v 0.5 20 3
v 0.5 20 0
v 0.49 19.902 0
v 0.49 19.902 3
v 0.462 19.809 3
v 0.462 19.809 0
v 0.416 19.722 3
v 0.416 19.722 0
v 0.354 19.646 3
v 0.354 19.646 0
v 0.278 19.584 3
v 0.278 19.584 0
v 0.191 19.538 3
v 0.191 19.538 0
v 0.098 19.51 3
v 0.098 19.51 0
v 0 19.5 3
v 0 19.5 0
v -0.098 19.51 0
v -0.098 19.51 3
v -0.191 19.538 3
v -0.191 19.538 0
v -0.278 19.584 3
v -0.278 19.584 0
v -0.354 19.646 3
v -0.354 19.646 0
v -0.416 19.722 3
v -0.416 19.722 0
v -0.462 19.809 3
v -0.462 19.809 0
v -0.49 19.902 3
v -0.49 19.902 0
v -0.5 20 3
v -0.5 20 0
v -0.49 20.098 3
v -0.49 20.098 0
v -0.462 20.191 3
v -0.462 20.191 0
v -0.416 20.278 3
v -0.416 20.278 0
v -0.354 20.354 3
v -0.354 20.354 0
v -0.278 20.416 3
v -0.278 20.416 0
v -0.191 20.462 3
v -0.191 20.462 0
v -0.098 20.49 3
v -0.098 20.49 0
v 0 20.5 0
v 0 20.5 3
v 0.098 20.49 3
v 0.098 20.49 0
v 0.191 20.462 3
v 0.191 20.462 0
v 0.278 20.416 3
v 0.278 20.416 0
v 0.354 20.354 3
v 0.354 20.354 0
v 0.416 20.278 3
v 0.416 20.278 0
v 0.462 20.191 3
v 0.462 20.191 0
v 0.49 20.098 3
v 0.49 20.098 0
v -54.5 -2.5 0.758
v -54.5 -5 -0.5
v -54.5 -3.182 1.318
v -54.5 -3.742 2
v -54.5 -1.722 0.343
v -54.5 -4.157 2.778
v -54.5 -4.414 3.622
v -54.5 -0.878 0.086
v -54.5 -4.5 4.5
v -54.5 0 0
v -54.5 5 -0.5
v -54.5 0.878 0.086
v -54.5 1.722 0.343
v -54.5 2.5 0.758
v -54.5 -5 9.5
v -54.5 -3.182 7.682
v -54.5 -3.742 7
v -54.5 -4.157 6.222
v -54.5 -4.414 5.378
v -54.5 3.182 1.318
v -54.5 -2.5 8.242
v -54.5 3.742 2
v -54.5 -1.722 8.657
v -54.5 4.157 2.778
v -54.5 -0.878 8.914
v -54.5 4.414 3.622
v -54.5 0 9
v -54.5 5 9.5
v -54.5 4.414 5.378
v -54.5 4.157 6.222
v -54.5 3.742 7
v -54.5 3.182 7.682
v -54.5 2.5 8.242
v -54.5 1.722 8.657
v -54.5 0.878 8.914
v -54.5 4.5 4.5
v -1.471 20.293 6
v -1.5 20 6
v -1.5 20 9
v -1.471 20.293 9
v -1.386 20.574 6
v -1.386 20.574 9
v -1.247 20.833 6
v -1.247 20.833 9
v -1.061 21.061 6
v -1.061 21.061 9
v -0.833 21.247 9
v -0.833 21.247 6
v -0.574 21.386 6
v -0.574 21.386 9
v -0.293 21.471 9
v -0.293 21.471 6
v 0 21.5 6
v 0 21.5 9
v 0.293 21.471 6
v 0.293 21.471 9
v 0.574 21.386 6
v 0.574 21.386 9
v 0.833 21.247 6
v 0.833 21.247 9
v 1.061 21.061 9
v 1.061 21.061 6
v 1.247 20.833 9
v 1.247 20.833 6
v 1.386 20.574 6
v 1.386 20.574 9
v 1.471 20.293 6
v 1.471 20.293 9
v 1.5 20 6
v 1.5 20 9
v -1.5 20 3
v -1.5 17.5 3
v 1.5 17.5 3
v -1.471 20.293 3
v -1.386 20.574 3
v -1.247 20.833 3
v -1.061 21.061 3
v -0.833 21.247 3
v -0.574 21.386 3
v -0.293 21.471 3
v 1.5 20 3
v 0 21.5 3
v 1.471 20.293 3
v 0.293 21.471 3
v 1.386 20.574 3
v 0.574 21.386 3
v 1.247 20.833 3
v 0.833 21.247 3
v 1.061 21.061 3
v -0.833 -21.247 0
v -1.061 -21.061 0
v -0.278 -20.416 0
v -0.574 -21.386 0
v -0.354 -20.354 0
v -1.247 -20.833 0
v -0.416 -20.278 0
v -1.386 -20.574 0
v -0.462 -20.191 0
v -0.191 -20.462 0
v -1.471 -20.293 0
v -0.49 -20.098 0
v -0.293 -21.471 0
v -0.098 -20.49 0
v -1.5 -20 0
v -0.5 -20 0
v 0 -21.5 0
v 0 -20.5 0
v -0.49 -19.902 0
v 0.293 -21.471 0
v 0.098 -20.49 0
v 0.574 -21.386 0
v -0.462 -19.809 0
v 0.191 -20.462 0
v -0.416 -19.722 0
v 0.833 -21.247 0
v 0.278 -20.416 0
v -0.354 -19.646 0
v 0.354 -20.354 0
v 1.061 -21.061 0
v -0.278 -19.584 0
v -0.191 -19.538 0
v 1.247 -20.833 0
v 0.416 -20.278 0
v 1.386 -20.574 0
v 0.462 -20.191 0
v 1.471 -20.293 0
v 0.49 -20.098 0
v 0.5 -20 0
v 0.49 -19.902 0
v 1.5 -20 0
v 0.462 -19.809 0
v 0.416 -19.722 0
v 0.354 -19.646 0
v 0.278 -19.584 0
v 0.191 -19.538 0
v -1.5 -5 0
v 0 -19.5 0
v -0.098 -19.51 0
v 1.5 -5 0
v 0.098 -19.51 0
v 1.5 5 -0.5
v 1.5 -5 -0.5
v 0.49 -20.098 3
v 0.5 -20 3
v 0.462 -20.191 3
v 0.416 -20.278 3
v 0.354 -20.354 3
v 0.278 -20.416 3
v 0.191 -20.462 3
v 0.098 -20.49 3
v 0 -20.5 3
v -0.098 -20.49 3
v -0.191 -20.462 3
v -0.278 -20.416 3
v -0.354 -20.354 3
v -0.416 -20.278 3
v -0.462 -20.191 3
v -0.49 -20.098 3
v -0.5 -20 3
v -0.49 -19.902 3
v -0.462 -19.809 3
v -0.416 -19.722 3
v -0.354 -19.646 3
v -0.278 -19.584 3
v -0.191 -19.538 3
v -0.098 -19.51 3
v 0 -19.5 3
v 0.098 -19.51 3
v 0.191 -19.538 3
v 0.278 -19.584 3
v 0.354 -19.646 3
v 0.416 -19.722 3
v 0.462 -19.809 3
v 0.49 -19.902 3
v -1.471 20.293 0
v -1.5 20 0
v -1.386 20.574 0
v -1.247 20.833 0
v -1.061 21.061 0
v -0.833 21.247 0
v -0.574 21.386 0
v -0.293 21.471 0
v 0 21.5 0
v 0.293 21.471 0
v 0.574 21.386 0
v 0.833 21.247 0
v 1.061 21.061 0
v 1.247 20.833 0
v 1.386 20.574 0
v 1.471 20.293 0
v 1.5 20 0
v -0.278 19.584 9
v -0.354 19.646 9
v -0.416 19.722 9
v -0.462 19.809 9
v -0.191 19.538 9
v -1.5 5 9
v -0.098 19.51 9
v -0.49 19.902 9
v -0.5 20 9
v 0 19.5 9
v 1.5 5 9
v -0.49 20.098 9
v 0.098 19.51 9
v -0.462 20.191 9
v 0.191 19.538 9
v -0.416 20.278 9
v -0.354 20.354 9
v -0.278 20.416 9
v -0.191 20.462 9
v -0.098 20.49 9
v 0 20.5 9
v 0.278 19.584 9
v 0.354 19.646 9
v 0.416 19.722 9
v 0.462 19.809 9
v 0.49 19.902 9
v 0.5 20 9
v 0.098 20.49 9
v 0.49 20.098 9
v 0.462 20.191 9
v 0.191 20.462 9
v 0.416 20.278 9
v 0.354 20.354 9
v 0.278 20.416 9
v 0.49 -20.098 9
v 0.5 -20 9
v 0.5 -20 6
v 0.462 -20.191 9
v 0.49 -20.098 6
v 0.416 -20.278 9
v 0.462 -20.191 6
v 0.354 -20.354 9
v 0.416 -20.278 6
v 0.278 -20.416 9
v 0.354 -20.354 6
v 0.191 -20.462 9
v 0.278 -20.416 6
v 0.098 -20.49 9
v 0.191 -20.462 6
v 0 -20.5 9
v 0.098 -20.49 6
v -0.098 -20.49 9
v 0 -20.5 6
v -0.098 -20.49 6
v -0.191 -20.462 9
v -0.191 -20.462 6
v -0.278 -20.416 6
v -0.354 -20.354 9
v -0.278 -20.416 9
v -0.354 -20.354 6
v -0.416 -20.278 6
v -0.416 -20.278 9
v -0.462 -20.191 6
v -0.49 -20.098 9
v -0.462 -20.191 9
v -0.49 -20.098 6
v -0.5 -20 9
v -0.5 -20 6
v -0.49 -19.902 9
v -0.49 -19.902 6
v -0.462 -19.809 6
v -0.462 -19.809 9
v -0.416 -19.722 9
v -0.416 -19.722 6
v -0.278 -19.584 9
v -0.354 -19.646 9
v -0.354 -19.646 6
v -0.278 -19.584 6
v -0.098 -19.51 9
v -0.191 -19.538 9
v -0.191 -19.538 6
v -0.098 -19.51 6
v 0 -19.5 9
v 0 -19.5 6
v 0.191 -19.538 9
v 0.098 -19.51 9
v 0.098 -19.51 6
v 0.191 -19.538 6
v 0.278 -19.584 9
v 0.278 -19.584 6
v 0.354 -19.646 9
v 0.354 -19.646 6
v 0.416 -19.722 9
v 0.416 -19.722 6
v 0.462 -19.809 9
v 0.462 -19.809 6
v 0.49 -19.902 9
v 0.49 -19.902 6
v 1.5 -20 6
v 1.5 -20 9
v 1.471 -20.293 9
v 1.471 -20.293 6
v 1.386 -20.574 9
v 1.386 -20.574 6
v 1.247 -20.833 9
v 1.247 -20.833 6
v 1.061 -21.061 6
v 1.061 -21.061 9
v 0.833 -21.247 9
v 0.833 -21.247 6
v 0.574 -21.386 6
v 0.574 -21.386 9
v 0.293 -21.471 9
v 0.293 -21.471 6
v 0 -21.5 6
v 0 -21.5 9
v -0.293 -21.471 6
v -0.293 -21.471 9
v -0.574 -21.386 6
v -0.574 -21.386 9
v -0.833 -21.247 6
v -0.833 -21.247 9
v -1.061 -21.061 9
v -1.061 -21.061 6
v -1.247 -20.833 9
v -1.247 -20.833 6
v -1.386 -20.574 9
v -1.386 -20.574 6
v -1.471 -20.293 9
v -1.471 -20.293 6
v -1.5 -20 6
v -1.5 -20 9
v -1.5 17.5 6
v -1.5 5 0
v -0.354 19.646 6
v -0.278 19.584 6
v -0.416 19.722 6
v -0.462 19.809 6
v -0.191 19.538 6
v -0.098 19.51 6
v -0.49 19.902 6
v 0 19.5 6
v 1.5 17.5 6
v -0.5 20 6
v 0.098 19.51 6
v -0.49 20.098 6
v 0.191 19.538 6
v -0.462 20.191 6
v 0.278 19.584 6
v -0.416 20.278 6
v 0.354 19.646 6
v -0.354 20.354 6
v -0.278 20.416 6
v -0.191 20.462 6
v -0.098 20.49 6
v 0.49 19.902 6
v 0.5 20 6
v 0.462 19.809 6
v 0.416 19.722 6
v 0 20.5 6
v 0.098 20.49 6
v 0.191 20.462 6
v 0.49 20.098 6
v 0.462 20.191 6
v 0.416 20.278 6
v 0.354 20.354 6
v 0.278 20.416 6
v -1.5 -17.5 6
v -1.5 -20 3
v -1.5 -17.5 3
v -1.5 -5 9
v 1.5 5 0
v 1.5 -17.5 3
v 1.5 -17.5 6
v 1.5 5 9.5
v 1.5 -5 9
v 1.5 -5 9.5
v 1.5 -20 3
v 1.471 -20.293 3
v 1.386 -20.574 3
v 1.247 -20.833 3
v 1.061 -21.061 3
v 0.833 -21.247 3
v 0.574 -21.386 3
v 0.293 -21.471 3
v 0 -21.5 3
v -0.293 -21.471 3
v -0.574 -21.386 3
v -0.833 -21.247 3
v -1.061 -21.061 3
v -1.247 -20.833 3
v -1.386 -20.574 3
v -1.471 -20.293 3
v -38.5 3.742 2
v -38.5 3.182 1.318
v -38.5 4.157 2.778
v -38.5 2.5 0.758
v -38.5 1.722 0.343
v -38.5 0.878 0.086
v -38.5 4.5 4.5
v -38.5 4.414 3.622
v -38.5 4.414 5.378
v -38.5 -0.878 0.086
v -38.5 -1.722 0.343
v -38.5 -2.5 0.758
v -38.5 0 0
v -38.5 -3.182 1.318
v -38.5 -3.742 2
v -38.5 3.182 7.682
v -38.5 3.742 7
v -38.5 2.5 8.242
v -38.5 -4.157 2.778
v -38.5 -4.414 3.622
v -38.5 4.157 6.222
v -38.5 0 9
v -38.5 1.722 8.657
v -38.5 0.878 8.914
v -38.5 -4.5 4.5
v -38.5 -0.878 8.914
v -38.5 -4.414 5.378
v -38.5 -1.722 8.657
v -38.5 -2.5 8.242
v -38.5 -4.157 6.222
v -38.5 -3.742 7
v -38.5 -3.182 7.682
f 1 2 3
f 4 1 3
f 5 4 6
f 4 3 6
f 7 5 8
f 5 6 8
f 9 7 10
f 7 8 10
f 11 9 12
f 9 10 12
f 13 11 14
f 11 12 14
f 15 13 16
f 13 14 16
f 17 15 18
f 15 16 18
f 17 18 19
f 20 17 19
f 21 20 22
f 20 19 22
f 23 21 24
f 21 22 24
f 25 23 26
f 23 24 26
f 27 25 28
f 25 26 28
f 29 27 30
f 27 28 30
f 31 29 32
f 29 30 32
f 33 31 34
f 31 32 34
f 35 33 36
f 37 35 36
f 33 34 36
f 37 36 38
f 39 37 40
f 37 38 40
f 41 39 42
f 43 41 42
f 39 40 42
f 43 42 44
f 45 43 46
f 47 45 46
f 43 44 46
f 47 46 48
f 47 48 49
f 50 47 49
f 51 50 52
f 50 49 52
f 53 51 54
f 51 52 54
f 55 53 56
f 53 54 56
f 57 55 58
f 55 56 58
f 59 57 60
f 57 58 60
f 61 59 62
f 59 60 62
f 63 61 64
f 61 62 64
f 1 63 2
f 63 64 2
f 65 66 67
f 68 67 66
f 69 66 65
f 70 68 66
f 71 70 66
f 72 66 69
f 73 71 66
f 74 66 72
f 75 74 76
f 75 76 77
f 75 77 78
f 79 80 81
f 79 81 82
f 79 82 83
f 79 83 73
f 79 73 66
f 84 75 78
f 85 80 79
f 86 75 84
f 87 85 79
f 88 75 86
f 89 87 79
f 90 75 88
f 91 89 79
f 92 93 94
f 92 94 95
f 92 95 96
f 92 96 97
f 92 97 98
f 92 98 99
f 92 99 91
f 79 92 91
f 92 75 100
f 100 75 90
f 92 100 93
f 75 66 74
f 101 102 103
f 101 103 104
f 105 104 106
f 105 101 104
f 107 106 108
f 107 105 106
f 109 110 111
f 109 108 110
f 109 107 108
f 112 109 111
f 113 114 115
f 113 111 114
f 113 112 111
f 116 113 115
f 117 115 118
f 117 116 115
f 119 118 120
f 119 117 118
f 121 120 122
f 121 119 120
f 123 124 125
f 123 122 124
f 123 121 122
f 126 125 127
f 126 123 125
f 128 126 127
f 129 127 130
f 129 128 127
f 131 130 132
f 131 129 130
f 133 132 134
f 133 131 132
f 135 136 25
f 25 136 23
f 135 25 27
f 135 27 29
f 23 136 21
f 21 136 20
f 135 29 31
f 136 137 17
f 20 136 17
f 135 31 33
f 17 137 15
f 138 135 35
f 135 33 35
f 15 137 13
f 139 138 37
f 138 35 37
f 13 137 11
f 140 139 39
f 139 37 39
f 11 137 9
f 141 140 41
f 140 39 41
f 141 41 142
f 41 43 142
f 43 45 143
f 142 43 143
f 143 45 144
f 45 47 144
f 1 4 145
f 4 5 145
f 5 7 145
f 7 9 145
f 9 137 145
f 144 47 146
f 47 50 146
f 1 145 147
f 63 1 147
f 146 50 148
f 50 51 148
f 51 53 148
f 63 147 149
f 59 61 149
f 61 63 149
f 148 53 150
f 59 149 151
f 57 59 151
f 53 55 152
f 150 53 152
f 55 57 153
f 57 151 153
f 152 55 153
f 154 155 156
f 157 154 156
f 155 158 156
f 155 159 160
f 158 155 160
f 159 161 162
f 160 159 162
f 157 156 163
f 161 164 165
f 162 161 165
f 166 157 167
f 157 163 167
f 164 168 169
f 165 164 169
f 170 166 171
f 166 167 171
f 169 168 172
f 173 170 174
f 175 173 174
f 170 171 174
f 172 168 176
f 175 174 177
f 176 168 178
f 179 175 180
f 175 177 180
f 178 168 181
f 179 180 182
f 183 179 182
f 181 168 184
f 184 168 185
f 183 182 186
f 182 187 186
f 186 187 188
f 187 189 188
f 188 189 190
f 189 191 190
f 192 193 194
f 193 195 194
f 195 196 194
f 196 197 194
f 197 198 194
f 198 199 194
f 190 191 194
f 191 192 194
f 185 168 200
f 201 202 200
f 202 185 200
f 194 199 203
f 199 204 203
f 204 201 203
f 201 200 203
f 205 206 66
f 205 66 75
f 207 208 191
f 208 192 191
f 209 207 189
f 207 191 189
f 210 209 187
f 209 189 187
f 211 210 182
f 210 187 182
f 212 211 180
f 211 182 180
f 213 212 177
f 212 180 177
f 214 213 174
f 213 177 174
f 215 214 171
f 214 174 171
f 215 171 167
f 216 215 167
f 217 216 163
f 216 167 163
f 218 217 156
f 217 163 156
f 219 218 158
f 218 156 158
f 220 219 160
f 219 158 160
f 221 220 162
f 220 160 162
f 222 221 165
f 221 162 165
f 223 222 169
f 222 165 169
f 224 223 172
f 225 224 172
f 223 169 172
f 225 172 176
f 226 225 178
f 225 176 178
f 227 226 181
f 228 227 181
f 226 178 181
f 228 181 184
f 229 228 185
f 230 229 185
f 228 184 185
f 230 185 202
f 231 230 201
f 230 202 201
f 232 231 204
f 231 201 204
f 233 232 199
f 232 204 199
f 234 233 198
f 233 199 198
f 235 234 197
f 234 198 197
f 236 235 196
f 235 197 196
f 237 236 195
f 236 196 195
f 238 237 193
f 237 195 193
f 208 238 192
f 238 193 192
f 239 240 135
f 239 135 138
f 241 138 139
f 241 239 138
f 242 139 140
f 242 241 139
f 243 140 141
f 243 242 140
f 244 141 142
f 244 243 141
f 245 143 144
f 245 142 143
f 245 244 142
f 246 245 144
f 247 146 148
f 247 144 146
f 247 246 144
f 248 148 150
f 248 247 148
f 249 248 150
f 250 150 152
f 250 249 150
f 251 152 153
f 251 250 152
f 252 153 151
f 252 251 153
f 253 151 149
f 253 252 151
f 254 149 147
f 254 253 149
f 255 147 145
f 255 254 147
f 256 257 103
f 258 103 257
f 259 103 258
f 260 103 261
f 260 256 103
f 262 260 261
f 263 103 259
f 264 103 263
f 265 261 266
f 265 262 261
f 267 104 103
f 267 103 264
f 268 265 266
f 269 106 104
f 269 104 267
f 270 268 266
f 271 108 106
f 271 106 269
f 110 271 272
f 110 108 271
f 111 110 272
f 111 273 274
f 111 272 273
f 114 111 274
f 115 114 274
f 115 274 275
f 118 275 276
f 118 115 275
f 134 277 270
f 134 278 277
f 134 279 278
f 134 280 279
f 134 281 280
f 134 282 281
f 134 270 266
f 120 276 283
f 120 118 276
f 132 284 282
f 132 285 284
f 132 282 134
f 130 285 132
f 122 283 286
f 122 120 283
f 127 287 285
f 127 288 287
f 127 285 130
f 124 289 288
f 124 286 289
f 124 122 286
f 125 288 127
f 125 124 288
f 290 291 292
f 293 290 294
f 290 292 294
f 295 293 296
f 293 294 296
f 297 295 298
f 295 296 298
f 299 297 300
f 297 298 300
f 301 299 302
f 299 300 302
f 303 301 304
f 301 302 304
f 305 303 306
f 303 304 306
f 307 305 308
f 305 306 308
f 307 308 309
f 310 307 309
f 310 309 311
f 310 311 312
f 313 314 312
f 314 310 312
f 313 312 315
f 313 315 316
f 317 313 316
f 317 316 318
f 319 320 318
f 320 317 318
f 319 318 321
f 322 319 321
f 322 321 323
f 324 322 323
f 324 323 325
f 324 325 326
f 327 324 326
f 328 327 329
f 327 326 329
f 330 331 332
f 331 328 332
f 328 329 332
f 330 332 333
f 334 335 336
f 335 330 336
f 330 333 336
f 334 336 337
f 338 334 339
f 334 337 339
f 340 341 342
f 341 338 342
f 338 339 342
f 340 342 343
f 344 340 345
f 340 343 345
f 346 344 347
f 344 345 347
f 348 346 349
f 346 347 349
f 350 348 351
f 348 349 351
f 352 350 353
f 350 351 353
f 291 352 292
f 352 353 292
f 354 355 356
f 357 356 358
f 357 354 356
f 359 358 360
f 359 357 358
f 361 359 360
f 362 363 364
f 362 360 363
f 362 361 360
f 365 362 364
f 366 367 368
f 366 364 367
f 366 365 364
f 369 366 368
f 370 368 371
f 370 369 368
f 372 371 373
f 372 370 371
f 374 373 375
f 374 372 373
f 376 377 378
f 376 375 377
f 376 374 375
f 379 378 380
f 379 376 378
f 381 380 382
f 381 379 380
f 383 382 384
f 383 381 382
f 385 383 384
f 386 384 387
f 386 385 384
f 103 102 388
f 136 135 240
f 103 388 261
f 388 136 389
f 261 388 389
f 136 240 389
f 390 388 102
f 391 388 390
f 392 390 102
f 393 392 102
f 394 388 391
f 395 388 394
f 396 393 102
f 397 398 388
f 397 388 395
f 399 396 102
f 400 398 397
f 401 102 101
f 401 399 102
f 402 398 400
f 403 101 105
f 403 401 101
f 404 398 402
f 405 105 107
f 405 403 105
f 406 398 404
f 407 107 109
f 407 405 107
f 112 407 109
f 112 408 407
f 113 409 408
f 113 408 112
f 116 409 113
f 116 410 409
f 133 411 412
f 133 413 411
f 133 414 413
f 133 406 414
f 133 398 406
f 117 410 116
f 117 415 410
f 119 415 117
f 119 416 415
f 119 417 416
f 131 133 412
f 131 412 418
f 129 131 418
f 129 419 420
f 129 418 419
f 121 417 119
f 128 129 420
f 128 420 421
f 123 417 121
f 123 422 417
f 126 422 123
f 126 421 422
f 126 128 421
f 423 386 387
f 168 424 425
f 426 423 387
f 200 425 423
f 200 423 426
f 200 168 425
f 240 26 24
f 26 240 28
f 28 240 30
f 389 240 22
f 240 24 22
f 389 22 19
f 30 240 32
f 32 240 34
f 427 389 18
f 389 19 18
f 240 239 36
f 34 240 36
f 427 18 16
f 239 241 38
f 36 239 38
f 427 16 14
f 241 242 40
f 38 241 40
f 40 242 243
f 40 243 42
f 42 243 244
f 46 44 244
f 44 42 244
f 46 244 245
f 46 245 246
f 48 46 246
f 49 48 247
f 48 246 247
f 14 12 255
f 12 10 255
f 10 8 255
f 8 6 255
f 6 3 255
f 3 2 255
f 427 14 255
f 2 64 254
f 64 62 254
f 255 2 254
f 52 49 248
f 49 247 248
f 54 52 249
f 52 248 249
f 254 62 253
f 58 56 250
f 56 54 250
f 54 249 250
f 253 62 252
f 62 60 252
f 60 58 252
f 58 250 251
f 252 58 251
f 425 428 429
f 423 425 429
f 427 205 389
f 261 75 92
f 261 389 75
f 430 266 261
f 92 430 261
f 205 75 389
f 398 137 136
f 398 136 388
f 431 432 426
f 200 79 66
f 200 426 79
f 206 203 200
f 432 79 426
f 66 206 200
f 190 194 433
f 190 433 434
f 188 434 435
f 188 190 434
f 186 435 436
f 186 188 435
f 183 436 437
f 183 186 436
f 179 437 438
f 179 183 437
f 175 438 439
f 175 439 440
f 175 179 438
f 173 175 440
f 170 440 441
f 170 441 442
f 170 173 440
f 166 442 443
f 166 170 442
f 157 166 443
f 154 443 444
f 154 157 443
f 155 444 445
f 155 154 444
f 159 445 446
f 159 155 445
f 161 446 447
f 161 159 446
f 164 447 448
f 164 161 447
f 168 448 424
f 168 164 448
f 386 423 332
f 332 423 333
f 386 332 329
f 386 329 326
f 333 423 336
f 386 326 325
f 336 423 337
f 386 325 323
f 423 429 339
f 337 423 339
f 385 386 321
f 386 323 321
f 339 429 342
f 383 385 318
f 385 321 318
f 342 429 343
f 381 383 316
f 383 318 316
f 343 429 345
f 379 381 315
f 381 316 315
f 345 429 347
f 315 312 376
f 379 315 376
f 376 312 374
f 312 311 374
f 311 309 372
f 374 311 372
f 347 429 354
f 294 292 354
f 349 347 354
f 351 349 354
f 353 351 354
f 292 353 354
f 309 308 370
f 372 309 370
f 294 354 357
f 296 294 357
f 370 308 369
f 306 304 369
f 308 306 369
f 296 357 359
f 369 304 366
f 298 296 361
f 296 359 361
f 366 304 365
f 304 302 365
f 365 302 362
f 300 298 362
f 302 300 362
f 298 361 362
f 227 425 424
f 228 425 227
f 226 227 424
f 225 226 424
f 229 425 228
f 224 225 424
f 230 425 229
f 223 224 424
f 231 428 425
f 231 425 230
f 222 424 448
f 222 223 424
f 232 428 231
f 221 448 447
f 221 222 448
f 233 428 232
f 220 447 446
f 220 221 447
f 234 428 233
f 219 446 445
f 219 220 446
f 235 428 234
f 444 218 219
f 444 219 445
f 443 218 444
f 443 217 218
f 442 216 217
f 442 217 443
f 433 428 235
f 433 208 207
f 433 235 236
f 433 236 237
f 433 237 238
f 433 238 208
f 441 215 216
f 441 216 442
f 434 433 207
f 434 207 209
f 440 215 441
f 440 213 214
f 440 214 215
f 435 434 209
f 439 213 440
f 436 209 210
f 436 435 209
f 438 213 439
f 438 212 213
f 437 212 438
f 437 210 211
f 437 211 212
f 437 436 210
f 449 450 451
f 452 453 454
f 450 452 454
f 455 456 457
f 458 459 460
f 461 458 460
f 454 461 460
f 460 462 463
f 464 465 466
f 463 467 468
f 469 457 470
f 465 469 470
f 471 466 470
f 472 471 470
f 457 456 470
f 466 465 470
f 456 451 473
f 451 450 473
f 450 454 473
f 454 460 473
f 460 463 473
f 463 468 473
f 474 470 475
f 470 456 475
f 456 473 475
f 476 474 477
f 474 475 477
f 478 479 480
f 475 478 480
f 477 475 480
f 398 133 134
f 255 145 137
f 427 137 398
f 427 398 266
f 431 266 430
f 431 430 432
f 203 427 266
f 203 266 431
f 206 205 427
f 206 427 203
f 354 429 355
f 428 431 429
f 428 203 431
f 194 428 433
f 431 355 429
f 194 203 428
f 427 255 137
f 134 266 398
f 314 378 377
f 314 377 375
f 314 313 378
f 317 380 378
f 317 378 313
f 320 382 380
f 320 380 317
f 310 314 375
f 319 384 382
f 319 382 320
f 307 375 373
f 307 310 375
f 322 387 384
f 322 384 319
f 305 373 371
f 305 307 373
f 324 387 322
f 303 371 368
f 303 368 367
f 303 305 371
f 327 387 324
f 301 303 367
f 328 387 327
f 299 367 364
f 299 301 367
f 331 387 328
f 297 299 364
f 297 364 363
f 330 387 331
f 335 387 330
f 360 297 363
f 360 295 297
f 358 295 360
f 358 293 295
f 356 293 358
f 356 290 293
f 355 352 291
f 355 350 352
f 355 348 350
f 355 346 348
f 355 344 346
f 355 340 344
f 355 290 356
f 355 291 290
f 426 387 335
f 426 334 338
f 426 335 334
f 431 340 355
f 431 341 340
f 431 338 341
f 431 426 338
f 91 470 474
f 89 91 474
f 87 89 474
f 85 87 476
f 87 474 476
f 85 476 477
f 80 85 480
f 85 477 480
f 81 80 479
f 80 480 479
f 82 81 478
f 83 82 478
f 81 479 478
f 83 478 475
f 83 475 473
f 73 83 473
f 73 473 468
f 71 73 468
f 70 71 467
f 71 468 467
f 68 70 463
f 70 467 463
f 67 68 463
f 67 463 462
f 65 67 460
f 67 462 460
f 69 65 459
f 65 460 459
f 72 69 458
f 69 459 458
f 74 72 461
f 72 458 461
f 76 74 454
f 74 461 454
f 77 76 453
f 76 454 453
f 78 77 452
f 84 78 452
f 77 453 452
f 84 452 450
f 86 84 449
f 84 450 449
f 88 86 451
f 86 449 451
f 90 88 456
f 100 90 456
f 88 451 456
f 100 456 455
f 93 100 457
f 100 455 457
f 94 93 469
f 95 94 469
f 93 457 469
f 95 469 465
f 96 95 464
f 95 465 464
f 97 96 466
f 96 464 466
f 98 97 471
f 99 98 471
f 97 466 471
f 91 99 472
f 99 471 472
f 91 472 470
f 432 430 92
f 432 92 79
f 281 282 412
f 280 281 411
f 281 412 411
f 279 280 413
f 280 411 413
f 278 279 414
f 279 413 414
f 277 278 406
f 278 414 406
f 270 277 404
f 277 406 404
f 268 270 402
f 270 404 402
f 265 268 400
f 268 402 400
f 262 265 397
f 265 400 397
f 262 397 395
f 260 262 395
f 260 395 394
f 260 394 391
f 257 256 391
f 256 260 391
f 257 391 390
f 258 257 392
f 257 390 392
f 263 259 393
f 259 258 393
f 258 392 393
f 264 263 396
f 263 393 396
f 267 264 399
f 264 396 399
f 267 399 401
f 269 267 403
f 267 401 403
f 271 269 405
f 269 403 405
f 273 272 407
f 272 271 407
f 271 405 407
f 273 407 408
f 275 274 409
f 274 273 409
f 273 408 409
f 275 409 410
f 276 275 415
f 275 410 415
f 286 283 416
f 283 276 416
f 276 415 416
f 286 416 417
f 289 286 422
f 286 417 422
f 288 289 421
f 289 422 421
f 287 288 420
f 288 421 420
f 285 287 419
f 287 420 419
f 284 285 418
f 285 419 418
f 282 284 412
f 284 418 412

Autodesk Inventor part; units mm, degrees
ref_plane "YZ Plane" through (0, 0, 0) normal (1, 0, 0) x (0, 1, 0)
ref_plane "XZ Plane" through (0, 0, 0) normal (0, 1, 0) x (-1, 0, 0)
ref_plane "XY Plane" through (0, 0, 0) normal (0, 0, 1) x (1, 0, 0)
sketch "Sketch1" plane through (0, 0, 0) normal (0, 0, 1) x (1, 0, 0)
  line L0 (1.5, 0) -> (1.5, 20)
  line L1 (-1.5, 20) -> (-1.5, 1.5)
  line L2 (1.5, 0) -> (1.5, -20)
  line L3 (-1.5, -20) -> (-1.5, -1.5)
  circle A0 centre (0, 20) radius 0.5
  arc A1 (1.5, 20) -> (-1.5, 20) centre (0, 20) ccw
  circle A2 centre (0, -20) radius 0.5
  arc A3 (-1.5, -20) -> (1.5, -20) centre (0, -20) ccw
  line L4 (-1.5, 1.5) -> (-1.5, -1.5)
  point P0 (0, 0)
extrude "Extrusion1" add sketch "Sketch1" along normal blind 9
sketch "Sketch3" plane through (-1.5, -20, 0) normal (-1, 0, 0) x (0, 0, 1)
  line L0 (9, 0) -> (9, 40) projected
  line L1 (9, 20) -> (0, 20)
  line L2 (0, 0) -> (0, 40) projected
  line L3 (9.5, 15) -> (-0.5, 15)
  line L4 (-0.5, 15) -> (-0.5, 25)
  line L5 (-0.5, 25) -> (9.5, 25)
  line L6 (9.5, 25) -> (9.5, 15)
  line L7 (9.5, 15) -> (-0.5, 25) construction
  line L8 (-0.5, 15) -> (9.5, 25) construction
  point P0 (4.5, 20)
  dimension "d29" = 10
  dimension "d30" = 10
extrude "Extrusion2" add sketch "Sketch3" along normal blind 53 and the other way blind 3
sketch "Sketch5" plane through (-54.5, -20, 0) normal (-1, 0, 0) x (0, 0, 1)
  line L0 (0, 15) -> (-0.5, 15) construction
  line L1 (9.5, 25) -> (9.5, 15) construction
  line L2 (-0.5, 15) -> (9.5, 25) construction
  point P0 (0, 20)
  point P1 (4.5, 20)
hole "Hole2" at (-54.5, 0, 4.5) direction (1, 0, 0) diameter 9 depth 16 clearance for "Hex Head Cap Screw ISO 24017" size "M8" standard "ISO"
sketch "Sketch6" plane through (1.5, 20, 9) normal (1, 0, 0) x (0, 0, -1)
  line L0 (9, -20) -> (-0.0817, -20) construction
  line L1 (6, -37.5) -> (6, -41.5)
  line L2 (6, -37.5) -> (3, -37.5)
  line L3 (3, -37.5) -> (3, -41.5)
  line L4 (6, -41.5) -> (3, -41.5)
  line L5 (6, -2.5) -> (6, 1.5)
  line L6 (6, -2.5) -> (3, -2.5)
  line L7 (3, -2.5) -> (3, 1.5)
  line L8 (6, 1.5) -> (3, 1.5)
extrude "Extrusion3" cut sketch "Sketch6" against normal through all
properties part number "Ciągaczka" material "Stainless Steel, 440C"
